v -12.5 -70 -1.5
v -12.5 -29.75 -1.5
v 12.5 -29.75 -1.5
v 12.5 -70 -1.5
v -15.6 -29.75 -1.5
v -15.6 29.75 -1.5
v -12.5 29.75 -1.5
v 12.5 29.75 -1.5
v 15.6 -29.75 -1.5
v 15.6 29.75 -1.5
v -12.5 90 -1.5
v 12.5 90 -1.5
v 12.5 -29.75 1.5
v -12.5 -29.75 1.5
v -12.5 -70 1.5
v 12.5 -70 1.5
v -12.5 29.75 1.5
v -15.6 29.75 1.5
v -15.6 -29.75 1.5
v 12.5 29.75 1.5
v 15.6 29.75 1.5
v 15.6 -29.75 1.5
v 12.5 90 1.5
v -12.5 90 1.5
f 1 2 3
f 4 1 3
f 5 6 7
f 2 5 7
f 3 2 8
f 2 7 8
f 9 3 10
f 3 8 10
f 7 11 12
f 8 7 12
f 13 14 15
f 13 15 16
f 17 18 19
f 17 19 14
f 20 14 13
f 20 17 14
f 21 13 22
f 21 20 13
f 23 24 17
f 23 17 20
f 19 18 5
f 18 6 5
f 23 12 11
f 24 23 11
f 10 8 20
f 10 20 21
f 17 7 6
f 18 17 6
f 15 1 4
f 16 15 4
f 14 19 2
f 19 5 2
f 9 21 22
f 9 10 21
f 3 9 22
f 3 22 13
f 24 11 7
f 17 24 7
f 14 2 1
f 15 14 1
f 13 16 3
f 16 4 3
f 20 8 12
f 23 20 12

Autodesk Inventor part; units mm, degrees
ref_plane "YZ Plane" through (0, 0, 0) normal (1, 0, 0) x (0, 1, 0)
ref_plane "XZ Plane" through (0, 0, 0) normal (0, 1, 0) x (-1, 0, 0)
ref_plane "XY Plane" through (0, 0, 0) normal (0, 0, 1) x (1, 0, 0)
sketch "Sketch1" plane through (0, 0, 0) normal (0, 0, 1) x (1, 0, 0)
  line L0 (-12.5, -70) -> (12.5, -70)
  line L1 (12.5, -70) -> (12.5, 70)
  line L2 (12.5, 70) -> (-12.5, 70)
  line L3 (-12.5, 70) -> (-12.5, -70)
  line L4 (-12.5, -70) -> (12.5, 70) construction
  line L5 (12.5, -70) -> (-12.5, 70) construction
  line L6 (0, 70) -> (0, -70)
  line L7 (12.5, 29.75) -> (15.6, 29.75)
  line L8 (15.6, 29.75) -> (15.6, -29.75)
  line L9 (15.6, -29.75) -> (12.5, -29.75)
  line L10 (12.5, -29.75) -> (12.5, 29.75)
  line L11 (-12.5, 29.75) -> (-15.6, 29.75)
  line L12 (-15.6, 29.75) -> (-15.6, -29.75)
  line L13 (-15.6, -29.75) -> (-12.5, -29.75)
  line L14 (-12.5, -29.75) -> (-12.5, 29.75)
  line L15 (-12.5, 70) -> (12.5, 70)
  line L16 (12.5, 70) -> (12.5, 90)
  line L17 (12.5, 90) -> (-12.5, 90)
  line L18 (-12.5, 90) -> (-12.5, 70)
  point P0 (0, 0)
  point P1 (15.6, 0)
  point P2 (0, 0)
  point P3 (-15.6, 0)
  point P4 (-12.5, 29.75)
  point P5 (-12.5, -29.75)
  point P6 (12.5, -29.75)
  dimension "d0" = 140
  dimension "d1" = 59.5
  dimension "d2" = 3.1
  dimension "d3" = 25
  dimension "d5" = 20
extrude "Plate1" add sketch "Sketch1" along normal mid plane 3
equation "\"d4\" = Thickness"
equation "\"BendRadius\" = Thickness"
equation "\"BendReliefWidth\" = Thickness"
equation "\"BendReliefDepth\" = 0.5 * Thickness"
equation "\"CornerReliefSize\" = 4 * Thickness"
equation "\"MinimumRemnant\" = 2 * Thickness"
equation "\"TransitionRadius\" = BendRadius"
equation "\"JacobiRadiusSize\" = BendRadius"
equation "\"GapSize\" = Thickness"
equation "\"Thickness\" = 3"
properties part number "Motor Fixation .2"
